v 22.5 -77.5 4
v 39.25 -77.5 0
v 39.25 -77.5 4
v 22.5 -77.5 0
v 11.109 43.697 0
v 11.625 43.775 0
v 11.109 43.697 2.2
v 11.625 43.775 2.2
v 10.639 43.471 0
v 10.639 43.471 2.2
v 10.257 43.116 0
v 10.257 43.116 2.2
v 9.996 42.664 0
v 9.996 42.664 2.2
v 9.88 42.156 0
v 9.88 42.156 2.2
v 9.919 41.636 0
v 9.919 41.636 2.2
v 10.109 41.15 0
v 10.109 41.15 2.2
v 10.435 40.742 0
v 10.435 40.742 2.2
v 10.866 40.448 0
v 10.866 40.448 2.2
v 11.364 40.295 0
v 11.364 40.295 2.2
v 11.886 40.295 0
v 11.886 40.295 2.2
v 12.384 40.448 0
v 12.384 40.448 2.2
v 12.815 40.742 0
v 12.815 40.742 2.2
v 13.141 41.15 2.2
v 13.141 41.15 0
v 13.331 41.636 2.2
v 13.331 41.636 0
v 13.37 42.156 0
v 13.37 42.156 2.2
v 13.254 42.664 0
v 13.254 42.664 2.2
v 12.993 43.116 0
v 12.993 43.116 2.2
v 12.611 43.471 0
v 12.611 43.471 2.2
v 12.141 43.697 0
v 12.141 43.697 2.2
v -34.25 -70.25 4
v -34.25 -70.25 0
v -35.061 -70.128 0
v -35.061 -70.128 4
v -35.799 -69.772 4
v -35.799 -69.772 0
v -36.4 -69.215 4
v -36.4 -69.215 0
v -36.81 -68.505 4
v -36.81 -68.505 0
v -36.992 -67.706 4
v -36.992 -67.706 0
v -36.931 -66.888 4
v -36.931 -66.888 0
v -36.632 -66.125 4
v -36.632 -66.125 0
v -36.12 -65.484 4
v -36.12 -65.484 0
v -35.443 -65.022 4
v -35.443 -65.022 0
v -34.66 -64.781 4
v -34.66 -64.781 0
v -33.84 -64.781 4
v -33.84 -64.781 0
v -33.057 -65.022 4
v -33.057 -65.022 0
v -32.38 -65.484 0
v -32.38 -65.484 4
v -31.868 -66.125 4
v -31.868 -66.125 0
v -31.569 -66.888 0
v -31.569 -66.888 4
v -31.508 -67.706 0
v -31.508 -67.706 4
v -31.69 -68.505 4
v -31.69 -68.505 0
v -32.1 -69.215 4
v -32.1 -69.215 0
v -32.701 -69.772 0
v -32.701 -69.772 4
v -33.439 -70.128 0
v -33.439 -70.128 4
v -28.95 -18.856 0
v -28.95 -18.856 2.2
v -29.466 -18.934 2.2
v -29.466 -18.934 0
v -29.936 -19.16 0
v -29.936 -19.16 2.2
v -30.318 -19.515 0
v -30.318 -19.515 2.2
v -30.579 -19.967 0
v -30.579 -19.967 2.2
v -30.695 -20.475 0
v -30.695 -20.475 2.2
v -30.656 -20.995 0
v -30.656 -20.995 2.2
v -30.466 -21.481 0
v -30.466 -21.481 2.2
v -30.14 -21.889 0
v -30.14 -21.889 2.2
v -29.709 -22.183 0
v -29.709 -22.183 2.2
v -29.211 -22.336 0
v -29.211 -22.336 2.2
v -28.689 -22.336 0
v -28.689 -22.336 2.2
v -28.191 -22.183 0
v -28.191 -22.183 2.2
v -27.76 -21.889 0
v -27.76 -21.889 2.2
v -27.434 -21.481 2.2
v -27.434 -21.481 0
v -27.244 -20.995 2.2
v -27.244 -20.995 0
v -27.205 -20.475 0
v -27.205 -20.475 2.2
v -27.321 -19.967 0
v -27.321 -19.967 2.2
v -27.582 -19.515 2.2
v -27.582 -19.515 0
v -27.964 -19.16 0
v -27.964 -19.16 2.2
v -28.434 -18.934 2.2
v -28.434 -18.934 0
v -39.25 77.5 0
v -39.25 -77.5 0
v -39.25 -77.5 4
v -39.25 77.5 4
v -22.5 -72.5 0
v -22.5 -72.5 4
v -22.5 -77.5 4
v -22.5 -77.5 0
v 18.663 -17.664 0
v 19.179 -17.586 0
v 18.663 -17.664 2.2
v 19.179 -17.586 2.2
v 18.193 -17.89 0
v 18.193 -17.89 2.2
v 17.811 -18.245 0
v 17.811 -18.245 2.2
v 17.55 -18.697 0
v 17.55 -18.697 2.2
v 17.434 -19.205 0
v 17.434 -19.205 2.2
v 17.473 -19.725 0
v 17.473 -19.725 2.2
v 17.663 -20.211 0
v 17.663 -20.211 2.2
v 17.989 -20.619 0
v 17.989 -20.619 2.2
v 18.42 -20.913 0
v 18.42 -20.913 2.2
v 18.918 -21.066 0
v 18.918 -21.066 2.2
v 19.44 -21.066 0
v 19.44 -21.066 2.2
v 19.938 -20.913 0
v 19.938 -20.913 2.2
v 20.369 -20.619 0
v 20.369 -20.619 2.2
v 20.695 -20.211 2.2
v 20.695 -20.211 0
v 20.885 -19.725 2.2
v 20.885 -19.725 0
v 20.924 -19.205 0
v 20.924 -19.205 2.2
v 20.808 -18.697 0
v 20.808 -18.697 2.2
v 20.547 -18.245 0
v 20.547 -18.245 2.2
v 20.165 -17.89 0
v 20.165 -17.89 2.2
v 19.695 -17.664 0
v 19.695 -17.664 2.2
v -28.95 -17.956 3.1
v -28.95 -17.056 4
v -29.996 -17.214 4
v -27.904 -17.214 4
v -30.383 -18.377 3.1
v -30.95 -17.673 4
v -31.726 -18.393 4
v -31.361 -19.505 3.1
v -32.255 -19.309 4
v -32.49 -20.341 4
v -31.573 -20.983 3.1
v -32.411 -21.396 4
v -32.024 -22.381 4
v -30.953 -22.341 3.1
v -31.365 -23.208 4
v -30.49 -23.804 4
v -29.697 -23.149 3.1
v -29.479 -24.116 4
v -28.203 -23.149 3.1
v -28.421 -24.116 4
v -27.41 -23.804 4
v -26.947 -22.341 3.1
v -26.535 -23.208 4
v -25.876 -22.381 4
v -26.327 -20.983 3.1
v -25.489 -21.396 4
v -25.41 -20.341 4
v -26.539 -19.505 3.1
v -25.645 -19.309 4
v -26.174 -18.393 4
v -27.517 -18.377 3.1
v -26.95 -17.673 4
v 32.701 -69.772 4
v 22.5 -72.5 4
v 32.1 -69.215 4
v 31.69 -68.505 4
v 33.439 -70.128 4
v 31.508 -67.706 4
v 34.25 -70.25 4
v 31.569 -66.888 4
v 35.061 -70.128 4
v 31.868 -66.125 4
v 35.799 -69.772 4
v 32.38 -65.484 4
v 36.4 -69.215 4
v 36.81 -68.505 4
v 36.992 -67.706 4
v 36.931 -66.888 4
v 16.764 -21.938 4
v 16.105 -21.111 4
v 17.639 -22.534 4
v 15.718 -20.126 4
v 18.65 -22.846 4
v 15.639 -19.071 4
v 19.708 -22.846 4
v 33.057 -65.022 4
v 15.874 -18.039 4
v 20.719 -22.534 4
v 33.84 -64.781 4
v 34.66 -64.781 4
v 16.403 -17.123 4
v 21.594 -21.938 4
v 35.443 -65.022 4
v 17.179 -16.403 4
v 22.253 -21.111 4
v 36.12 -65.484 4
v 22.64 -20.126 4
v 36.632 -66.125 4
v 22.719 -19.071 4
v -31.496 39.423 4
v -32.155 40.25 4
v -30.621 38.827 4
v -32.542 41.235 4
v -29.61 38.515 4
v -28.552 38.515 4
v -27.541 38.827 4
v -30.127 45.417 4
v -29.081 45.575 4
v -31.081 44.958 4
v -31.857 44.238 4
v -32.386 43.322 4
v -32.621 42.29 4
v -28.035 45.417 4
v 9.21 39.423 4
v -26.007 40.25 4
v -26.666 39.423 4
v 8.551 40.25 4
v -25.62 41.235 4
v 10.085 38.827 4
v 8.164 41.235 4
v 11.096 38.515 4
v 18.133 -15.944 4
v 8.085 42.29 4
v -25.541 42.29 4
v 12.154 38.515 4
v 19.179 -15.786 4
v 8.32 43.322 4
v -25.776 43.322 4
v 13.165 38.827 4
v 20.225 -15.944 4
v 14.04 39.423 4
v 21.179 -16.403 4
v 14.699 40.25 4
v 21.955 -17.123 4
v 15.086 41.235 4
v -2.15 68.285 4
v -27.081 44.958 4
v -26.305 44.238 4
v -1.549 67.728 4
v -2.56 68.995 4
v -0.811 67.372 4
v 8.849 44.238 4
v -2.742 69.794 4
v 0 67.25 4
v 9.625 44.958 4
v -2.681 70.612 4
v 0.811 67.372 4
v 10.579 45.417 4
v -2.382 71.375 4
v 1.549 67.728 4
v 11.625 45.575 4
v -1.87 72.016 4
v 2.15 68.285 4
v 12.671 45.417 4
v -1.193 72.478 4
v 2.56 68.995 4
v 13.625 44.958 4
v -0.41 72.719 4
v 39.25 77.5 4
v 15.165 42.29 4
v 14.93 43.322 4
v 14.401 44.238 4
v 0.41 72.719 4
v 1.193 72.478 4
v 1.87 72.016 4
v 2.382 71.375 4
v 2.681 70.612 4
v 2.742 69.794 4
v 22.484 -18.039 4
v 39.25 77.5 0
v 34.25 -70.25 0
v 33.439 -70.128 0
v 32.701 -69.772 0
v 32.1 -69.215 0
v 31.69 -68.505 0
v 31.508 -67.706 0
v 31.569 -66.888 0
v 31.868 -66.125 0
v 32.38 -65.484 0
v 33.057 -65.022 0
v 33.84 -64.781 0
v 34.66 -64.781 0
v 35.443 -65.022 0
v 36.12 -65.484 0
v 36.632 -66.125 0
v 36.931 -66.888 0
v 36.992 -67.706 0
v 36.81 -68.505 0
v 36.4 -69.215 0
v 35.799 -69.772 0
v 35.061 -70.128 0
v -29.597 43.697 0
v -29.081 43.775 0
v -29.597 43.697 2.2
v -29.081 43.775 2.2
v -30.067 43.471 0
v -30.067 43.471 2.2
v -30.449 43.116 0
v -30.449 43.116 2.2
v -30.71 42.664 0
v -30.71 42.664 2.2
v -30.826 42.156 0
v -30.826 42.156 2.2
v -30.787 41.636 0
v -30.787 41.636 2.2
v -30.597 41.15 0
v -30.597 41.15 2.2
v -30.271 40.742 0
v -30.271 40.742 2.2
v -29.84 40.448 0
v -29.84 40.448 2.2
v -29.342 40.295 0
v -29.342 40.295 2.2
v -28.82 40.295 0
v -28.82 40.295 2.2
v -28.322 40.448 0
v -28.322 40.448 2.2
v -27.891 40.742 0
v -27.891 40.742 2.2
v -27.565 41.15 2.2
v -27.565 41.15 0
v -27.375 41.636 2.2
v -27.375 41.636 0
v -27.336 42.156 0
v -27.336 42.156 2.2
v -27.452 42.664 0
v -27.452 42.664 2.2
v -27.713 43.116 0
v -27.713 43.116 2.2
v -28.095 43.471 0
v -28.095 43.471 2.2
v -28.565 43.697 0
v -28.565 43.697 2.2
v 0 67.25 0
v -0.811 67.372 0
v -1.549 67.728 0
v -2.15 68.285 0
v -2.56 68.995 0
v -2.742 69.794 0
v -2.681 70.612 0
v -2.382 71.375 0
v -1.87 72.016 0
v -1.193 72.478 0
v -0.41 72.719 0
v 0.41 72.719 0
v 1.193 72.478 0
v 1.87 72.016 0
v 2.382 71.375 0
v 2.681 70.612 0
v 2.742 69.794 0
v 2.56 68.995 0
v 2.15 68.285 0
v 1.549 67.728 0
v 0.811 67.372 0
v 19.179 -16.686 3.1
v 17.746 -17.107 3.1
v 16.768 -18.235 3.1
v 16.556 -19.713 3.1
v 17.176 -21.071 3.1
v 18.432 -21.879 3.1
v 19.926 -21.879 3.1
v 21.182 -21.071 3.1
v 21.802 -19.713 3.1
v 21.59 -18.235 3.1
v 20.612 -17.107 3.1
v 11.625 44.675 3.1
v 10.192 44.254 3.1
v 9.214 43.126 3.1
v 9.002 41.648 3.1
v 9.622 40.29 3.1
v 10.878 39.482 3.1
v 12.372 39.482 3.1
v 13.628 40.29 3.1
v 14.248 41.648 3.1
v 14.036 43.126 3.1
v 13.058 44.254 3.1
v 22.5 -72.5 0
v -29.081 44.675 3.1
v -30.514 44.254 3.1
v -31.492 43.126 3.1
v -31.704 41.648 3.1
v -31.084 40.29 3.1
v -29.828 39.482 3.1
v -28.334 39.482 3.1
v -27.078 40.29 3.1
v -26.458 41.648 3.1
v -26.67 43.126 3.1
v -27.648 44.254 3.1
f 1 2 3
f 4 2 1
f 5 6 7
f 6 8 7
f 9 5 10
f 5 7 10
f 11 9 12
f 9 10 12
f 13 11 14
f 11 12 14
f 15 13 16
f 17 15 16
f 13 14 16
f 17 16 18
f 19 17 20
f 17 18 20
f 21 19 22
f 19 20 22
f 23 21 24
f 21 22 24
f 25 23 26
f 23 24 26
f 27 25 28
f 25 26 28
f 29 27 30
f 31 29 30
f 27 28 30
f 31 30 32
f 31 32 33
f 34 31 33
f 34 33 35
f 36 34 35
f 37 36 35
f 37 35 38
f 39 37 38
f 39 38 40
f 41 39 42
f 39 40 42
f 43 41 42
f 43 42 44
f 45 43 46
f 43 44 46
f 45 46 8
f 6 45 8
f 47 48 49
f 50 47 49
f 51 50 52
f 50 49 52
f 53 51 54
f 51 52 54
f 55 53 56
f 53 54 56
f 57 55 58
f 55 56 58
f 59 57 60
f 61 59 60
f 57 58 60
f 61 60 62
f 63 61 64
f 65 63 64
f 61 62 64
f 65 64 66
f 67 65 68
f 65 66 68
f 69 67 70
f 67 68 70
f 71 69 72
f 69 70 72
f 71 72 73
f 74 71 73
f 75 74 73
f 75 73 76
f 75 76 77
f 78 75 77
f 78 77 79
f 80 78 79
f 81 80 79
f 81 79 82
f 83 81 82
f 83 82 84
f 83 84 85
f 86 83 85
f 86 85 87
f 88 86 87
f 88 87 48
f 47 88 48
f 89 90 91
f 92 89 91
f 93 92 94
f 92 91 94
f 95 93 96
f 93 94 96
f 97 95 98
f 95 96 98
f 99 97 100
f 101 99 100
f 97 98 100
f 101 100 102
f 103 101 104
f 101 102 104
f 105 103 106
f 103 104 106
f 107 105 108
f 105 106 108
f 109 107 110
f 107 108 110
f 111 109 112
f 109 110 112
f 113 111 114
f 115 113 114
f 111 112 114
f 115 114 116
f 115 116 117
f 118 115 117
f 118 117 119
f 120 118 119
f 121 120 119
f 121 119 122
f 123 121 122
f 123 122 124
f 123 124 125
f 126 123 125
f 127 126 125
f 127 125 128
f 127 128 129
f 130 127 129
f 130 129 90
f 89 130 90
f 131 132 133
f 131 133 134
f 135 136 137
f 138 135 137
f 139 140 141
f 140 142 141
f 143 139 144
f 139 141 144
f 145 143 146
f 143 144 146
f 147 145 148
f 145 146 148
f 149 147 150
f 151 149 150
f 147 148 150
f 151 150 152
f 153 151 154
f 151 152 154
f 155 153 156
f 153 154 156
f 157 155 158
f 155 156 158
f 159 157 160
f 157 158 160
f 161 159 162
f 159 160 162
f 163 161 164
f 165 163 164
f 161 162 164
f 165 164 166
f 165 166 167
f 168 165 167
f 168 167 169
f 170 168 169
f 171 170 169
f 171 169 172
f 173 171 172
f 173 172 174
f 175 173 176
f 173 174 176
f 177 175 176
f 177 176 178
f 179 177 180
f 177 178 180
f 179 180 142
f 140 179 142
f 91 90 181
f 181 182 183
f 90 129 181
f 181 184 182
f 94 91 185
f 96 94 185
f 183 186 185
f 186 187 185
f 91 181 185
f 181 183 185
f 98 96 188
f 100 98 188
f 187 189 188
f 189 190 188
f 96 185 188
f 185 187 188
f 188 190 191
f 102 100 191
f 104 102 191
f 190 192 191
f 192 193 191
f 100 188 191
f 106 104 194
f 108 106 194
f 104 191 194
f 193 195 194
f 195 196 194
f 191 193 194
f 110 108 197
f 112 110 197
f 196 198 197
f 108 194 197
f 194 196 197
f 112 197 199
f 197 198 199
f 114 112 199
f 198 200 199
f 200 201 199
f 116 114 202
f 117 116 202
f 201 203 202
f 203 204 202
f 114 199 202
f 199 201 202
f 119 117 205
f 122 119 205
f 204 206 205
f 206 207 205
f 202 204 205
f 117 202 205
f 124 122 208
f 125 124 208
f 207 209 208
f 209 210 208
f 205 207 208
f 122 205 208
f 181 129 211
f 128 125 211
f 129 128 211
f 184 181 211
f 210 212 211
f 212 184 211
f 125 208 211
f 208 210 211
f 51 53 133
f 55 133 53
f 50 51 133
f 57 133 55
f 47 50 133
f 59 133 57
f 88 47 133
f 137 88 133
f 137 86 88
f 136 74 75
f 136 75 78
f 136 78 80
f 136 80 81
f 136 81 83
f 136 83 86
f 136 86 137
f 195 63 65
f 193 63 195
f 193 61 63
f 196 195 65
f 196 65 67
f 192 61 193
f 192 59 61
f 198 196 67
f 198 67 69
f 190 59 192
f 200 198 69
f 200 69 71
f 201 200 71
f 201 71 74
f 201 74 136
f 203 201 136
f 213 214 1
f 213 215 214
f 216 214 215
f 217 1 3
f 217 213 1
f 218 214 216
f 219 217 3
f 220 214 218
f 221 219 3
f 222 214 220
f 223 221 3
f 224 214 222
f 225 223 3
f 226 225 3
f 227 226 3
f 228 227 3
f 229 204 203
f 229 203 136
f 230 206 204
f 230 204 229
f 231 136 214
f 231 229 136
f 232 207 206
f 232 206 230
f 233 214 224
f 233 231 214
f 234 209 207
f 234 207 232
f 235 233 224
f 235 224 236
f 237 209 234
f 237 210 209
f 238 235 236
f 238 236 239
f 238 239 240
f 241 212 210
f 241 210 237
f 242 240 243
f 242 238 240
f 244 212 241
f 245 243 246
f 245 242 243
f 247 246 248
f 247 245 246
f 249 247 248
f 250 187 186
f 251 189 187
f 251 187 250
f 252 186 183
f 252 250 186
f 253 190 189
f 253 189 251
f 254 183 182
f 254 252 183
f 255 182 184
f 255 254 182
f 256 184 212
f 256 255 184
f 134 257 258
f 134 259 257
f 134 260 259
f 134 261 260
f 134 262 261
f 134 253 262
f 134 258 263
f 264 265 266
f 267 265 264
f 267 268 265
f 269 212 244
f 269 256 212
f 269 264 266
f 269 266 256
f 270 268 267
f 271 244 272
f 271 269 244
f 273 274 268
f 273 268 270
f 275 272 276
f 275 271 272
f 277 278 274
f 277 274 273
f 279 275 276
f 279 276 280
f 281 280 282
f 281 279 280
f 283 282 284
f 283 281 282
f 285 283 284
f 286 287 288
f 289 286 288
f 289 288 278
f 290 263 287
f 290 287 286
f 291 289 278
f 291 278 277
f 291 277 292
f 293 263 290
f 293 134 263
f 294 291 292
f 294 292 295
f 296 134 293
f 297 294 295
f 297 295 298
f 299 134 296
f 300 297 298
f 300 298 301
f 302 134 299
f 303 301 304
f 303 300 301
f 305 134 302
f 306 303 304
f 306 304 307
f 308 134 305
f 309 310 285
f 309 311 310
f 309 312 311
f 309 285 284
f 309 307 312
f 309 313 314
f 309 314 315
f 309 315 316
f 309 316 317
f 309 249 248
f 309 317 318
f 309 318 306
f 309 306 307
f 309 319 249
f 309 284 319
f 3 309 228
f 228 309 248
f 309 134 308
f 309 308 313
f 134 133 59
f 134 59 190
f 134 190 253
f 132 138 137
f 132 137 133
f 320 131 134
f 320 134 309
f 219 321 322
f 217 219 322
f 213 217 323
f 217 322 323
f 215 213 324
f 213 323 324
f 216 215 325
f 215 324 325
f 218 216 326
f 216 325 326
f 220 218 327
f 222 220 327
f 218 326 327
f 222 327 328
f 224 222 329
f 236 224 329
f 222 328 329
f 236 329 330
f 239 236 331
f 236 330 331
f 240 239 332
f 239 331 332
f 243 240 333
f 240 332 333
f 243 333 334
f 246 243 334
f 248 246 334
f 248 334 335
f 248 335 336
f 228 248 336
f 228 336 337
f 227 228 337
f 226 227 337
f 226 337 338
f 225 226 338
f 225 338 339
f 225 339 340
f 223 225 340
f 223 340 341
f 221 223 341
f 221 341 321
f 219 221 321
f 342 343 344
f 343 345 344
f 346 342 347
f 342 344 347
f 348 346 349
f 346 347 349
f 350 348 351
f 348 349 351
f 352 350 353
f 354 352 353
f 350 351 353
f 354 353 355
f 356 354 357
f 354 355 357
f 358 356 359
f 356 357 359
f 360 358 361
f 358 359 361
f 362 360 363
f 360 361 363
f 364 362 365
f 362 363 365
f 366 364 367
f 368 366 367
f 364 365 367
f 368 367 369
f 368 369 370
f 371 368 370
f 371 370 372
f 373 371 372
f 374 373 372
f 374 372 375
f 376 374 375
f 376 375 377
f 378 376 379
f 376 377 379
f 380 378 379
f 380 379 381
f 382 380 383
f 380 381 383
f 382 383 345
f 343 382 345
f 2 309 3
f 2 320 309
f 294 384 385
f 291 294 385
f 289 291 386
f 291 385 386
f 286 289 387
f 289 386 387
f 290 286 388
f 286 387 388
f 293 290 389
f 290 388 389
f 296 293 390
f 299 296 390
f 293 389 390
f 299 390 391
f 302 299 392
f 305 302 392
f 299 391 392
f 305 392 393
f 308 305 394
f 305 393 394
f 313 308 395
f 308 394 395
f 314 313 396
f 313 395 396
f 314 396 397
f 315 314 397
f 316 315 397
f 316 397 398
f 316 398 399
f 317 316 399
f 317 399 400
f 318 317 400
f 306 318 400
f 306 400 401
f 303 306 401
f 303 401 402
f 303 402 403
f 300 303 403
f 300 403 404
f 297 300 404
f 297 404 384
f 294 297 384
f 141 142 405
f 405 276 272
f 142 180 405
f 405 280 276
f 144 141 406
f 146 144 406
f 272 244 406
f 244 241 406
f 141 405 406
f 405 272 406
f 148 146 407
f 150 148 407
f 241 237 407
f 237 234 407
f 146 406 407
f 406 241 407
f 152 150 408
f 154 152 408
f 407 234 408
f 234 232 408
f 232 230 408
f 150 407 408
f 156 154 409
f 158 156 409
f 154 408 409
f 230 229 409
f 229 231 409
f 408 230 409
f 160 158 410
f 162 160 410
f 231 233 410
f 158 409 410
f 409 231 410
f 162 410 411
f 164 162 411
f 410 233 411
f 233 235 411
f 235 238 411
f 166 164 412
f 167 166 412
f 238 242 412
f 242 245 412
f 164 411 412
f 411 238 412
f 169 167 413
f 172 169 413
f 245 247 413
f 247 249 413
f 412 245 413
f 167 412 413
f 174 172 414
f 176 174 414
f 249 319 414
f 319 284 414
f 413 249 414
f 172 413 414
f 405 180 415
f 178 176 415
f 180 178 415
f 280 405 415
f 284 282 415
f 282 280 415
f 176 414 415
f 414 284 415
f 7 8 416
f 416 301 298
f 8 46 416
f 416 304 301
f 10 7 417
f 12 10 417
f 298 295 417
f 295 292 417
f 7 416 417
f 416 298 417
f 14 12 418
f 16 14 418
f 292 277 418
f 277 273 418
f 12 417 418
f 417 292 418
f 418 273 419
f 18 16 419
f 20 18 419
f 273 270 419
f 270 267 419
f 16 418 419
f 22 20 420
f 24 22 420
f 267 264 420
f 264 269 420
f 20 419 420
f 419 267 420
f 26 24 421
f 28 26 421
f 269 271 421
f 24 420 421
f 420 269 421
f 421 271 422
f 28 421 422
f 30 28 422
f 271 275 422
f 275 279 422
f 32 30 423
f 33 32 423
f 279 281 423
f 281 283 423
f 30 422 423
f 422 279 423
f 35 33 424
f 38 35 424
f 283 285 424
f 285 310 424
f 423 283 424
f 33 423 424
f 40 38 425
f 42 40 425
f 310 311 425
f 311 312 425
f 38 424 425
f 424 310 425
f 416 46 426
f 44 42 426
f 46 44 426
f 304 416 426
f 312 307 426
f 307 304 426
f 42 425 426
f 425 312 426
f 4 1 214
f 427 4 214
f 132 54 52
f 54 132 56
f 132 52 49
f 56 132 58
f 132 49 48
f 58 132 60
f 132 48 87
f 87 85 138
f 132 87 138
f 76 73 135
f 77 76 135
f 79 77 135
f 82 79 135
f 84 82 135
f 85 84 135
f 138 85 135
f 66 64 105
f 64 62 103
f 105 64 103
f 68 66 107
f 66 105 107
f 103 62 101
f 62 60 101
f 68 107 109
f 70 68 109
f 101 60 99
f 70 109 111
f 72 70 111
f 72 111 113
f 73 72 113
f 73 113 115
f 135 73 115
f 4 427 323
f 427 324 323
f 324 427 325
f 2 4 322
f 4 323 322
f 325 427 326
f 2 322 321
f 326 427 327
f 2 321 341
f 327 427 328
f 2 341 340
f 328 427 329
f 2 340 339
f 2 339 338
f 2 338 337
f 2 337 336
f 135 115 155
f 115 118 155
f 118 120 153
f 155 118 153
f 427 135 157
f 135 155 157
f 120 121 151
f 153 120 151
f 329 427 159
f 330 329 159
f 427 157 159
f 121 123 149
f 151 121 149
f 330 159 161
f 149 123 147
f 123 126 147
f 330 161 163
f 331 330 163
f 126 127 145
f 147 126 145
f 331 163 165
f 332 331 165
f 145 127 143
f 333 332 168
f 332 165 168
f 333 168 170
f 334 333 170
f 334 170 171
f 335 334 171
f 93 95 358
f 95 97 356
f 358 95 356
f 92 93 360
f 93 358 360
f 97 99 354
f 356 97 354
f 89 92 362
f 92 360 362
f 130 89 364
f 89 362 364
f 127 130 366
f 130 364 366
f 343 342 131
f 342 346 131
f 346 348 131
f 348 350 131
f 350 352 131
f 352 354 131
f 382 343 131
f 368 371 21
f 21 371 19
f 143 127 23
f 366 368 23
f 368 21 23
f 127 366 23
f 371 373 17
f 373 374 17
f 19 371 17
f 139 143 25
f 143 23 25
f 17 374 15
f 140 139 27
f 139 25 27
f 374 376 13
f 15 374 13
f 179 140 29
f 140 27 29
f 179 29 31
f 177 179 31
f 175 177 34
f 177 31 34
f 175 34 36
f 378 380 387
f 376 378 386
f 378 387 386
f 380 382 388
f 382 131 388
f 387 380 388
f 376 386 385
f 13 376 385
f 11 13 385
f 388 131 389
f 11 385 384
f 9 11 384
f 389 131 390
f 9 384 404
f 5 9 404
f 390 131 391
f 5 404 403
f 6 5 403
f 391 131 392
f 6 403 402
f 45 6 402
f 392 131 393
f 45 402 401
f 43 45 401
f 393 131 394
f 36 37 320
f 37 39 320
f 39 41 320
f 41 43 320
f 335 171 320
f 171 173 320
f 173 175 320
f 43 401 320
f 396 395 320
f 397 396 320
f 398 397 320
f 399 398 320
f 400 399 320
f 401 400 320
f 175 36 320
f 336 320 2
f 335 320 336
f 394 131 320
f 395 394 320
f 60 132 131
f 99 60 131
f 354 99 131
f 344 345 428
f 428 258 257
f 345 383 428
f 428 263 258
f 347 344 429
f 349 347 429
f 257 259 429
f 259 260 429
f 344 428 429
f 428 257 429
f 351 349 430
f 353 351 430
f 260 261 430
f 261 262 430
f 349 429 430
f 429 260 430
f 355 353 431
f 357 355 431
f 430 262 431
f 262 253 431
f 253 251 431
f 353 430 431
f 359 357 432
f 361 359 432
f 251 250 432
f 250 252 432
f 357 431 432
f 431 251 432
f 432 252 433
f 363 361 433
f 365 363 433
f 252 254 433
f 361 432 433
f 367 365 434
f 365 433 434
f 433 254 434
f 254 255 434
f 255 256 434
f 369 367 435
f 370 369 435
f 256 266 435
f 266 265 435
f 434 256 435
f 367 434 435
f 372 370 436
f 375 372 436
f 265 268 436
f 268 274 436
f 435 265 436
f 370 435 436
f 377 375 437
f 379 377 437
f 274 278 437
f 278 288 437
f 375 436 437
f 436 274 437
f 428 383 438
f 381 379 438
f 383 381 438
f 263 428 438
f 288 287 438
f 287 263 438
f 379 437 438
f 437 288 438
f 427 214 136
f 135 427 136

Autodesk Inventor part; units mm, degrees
ref_plane "YZ Plane" through (0, 0, 0) normal (1, 0, 0) x (0, 1, 0)
ref_plane "XZ Plane" through (0, 0, 0) normal (0, 1, 0) x (-1, 0, 0)
ref_plane "XY Plane" through (0, 0, 0) normal (0, 0, 1) x (1, 0, 0)
sketch "Sketch2" plane through (0, 0, 0) normal (0, 0, 1) x (1, 0, 0)
  line L0 (39.25, -77.5) -> (-39.25, -77.5)
  line L1 (-39.25, -77.5) -> (-39.25, 77.5)
  line L2 (-39.25, 77.5) -> (39.25, 77.5)
  line L3 (39.25, 77.5) -> (39.25, -77.5)
  line L4 (39.25, -77.5) -> (-39.25, 77.5) construction
  line L5 (-39.25, -77.5) -> (39.25, 77.5) construction
  point P0 (0, 0)
  dimension "d0" = 78.5
  dimension "d1" = 155
extrude "Extrusion1" add sketch "Sketch2" along normal blind 4
sketch "Sketch3" plane through (0, 0, 4) normal (0, 0, 1) x (1, 0, 0)
  line L0 (0, 108.5) -> (0, -108.5) construction
  line L1 (39.25, 77.5) -> (-39.25, 77.5) construction
  point P0 (0, 0)
  point P1 (0, 70)
  point P2 (-34.25, -67.5)
  point P3 (34.25, -67.5)
  dimension "d4" = 34.25
  dimension "d5" = 34.25
  dimension "d6" = 137.5
  dimension "d8" = 7.5
  dimension "d9" = 137.5
hole "Hole1" at (0, 70, 4) at (-34.25, -67.5, 4) at (34.25, -67.5, 4) direction (0, 0, -1) diameter 5.5 depth 9.5
sketch "Sketch4" plane through (0, 0, 0) normal (0, 0, -1) x (-1, 0, 0)
  line L0 (-27.565, 44.5) -> (-27.565, 40.5) construction
  line L1 (-27.565, 40.5) -> (-37.565, 40.5) construction
  line L2 (-37.565, 40.5) -> (-37.565, 32.5) construction
  line L3 (-37.565, 32.5) -> (-27.565, 32.5) construction
  line L4 (-27.565, 32.5) -> (-27.565, -48.52) construction
  line L5 (-27.565, -48.52) -> (-10.565, -48.52) construction
  line L6 (-10.565, -48.52) -> (-10.565, -58.52) construction
  line L7 (-10.565, -58.52) -> (-2.565, -58.52) construction
  line L8 (-2.565, -58.52) -> (-2.565, -48.52) construction
  line L9 (-2.565, -48.52) -> (37.5, -48.52) construction
  line L10 (37.5, -48.52) -> (37.5, 44.5) construction
  line L11 (37.5, 44.5) -> (28.5, 44.5) construction
  line L12 (28.5, 44.5) -> (26.5, 46.5) construction
  line L13 (26.5, 46.5) -> (18.5, 46.5) construction
  line L14 (18.5, 46.5) -> (18.5, 56.5) construction
  line L15 (18.5, 56.5) -> (7.5, 56.5) construction
  line L16 (7.5, 56.5) -> (7.5, 46.5) construction
  line L17 (7.5, 46.5) -> (-6.565, 46.5) construction
  line L18 (-6.565, 46.5) -> (-8.565, 44.5) construction
  line L19 (-8.565, 44.5) -> (-27.565, 44.5) construction
  circle A0 centre (29.081, 42.025) radius 1.6 construction
  circle A1 centre (-11.625, 42.025) radius 1.6 construction
  circle A2 centre (28.95, -20.606) radius 1.6 construction
  circle A3 centre (-19.179, -19.336) radius 1.6 construction
  point P0 (0, 0)
hole "Hole2" at (-29.081, 42.025, 0) at (-28.95, -20.606, 0) at (19.179, -19.336, 0) at (11.625, 42.025, 0) direction (0, 0, 1) diameter 3.5 depth 9.5
chamfer "Chamfer1" distance 1.8 angle 45 4 edges at (-28.95, -22.356, 4) (19.179, -21.086, 4) (-29.081, 40.275, 4) (11.625, 40.275, 4)
sketch "Sketch6" plane through (0, 0, 4) normal (0, 0, 1) x (1, 0, 0)
  circle A0 centre (-28.95, -20.606) radius 3.55 construction
  circle A1 centre (11.625, 42.025) radius 3.55 construction
  circle A2 centre (-34.25, -67.5) radius 2.75 construction
  circle A3 centre (0, 70) radius 2.75 construction
  circle A4 centre (34.25, -67.5) radius 2.75 construction
  line L0 (39.25, 77.5) -> (-39.25, 77.5) construction
  line L1 (-39.25, 77.5) -> (-39.25, -77.5) construction
  line L2 (-39.25, -77.5) -> (39.25, -77.5) construction
  line L3 (39.25, -77.5) -> (39.25, 77.5) construction
  circle A5 centre (19.179, -19.336) radius 3.55 construction
  circle A6 centre (-29.081, 42.025) radius 3.55 construction
  line L4 (22.5, -72.5) -> (-22.5, -72.5)
  line L5 (-22.5, -72.5) -> (-22.5, -77.5)
  line L6 (-22.5, -77.5) -> (22.5, -77.5)
  line L7 (22.5, -77.5) -> (22.5, -72.5)
  line L8 (0, 108.5) -> (0, -108.5) construction
  point P0 (0, 0)
  dimension "d33" = 45
  dimension "d34" = 5
  dimension "d35" = 22.5
extrude "Extrusion3" cut sketch "Sketch6" against normal blind 10
equation "\"d35\" = 0.5 * d33"
properties part number "P042_BoitierCouvercleV4_moduleHaut"
